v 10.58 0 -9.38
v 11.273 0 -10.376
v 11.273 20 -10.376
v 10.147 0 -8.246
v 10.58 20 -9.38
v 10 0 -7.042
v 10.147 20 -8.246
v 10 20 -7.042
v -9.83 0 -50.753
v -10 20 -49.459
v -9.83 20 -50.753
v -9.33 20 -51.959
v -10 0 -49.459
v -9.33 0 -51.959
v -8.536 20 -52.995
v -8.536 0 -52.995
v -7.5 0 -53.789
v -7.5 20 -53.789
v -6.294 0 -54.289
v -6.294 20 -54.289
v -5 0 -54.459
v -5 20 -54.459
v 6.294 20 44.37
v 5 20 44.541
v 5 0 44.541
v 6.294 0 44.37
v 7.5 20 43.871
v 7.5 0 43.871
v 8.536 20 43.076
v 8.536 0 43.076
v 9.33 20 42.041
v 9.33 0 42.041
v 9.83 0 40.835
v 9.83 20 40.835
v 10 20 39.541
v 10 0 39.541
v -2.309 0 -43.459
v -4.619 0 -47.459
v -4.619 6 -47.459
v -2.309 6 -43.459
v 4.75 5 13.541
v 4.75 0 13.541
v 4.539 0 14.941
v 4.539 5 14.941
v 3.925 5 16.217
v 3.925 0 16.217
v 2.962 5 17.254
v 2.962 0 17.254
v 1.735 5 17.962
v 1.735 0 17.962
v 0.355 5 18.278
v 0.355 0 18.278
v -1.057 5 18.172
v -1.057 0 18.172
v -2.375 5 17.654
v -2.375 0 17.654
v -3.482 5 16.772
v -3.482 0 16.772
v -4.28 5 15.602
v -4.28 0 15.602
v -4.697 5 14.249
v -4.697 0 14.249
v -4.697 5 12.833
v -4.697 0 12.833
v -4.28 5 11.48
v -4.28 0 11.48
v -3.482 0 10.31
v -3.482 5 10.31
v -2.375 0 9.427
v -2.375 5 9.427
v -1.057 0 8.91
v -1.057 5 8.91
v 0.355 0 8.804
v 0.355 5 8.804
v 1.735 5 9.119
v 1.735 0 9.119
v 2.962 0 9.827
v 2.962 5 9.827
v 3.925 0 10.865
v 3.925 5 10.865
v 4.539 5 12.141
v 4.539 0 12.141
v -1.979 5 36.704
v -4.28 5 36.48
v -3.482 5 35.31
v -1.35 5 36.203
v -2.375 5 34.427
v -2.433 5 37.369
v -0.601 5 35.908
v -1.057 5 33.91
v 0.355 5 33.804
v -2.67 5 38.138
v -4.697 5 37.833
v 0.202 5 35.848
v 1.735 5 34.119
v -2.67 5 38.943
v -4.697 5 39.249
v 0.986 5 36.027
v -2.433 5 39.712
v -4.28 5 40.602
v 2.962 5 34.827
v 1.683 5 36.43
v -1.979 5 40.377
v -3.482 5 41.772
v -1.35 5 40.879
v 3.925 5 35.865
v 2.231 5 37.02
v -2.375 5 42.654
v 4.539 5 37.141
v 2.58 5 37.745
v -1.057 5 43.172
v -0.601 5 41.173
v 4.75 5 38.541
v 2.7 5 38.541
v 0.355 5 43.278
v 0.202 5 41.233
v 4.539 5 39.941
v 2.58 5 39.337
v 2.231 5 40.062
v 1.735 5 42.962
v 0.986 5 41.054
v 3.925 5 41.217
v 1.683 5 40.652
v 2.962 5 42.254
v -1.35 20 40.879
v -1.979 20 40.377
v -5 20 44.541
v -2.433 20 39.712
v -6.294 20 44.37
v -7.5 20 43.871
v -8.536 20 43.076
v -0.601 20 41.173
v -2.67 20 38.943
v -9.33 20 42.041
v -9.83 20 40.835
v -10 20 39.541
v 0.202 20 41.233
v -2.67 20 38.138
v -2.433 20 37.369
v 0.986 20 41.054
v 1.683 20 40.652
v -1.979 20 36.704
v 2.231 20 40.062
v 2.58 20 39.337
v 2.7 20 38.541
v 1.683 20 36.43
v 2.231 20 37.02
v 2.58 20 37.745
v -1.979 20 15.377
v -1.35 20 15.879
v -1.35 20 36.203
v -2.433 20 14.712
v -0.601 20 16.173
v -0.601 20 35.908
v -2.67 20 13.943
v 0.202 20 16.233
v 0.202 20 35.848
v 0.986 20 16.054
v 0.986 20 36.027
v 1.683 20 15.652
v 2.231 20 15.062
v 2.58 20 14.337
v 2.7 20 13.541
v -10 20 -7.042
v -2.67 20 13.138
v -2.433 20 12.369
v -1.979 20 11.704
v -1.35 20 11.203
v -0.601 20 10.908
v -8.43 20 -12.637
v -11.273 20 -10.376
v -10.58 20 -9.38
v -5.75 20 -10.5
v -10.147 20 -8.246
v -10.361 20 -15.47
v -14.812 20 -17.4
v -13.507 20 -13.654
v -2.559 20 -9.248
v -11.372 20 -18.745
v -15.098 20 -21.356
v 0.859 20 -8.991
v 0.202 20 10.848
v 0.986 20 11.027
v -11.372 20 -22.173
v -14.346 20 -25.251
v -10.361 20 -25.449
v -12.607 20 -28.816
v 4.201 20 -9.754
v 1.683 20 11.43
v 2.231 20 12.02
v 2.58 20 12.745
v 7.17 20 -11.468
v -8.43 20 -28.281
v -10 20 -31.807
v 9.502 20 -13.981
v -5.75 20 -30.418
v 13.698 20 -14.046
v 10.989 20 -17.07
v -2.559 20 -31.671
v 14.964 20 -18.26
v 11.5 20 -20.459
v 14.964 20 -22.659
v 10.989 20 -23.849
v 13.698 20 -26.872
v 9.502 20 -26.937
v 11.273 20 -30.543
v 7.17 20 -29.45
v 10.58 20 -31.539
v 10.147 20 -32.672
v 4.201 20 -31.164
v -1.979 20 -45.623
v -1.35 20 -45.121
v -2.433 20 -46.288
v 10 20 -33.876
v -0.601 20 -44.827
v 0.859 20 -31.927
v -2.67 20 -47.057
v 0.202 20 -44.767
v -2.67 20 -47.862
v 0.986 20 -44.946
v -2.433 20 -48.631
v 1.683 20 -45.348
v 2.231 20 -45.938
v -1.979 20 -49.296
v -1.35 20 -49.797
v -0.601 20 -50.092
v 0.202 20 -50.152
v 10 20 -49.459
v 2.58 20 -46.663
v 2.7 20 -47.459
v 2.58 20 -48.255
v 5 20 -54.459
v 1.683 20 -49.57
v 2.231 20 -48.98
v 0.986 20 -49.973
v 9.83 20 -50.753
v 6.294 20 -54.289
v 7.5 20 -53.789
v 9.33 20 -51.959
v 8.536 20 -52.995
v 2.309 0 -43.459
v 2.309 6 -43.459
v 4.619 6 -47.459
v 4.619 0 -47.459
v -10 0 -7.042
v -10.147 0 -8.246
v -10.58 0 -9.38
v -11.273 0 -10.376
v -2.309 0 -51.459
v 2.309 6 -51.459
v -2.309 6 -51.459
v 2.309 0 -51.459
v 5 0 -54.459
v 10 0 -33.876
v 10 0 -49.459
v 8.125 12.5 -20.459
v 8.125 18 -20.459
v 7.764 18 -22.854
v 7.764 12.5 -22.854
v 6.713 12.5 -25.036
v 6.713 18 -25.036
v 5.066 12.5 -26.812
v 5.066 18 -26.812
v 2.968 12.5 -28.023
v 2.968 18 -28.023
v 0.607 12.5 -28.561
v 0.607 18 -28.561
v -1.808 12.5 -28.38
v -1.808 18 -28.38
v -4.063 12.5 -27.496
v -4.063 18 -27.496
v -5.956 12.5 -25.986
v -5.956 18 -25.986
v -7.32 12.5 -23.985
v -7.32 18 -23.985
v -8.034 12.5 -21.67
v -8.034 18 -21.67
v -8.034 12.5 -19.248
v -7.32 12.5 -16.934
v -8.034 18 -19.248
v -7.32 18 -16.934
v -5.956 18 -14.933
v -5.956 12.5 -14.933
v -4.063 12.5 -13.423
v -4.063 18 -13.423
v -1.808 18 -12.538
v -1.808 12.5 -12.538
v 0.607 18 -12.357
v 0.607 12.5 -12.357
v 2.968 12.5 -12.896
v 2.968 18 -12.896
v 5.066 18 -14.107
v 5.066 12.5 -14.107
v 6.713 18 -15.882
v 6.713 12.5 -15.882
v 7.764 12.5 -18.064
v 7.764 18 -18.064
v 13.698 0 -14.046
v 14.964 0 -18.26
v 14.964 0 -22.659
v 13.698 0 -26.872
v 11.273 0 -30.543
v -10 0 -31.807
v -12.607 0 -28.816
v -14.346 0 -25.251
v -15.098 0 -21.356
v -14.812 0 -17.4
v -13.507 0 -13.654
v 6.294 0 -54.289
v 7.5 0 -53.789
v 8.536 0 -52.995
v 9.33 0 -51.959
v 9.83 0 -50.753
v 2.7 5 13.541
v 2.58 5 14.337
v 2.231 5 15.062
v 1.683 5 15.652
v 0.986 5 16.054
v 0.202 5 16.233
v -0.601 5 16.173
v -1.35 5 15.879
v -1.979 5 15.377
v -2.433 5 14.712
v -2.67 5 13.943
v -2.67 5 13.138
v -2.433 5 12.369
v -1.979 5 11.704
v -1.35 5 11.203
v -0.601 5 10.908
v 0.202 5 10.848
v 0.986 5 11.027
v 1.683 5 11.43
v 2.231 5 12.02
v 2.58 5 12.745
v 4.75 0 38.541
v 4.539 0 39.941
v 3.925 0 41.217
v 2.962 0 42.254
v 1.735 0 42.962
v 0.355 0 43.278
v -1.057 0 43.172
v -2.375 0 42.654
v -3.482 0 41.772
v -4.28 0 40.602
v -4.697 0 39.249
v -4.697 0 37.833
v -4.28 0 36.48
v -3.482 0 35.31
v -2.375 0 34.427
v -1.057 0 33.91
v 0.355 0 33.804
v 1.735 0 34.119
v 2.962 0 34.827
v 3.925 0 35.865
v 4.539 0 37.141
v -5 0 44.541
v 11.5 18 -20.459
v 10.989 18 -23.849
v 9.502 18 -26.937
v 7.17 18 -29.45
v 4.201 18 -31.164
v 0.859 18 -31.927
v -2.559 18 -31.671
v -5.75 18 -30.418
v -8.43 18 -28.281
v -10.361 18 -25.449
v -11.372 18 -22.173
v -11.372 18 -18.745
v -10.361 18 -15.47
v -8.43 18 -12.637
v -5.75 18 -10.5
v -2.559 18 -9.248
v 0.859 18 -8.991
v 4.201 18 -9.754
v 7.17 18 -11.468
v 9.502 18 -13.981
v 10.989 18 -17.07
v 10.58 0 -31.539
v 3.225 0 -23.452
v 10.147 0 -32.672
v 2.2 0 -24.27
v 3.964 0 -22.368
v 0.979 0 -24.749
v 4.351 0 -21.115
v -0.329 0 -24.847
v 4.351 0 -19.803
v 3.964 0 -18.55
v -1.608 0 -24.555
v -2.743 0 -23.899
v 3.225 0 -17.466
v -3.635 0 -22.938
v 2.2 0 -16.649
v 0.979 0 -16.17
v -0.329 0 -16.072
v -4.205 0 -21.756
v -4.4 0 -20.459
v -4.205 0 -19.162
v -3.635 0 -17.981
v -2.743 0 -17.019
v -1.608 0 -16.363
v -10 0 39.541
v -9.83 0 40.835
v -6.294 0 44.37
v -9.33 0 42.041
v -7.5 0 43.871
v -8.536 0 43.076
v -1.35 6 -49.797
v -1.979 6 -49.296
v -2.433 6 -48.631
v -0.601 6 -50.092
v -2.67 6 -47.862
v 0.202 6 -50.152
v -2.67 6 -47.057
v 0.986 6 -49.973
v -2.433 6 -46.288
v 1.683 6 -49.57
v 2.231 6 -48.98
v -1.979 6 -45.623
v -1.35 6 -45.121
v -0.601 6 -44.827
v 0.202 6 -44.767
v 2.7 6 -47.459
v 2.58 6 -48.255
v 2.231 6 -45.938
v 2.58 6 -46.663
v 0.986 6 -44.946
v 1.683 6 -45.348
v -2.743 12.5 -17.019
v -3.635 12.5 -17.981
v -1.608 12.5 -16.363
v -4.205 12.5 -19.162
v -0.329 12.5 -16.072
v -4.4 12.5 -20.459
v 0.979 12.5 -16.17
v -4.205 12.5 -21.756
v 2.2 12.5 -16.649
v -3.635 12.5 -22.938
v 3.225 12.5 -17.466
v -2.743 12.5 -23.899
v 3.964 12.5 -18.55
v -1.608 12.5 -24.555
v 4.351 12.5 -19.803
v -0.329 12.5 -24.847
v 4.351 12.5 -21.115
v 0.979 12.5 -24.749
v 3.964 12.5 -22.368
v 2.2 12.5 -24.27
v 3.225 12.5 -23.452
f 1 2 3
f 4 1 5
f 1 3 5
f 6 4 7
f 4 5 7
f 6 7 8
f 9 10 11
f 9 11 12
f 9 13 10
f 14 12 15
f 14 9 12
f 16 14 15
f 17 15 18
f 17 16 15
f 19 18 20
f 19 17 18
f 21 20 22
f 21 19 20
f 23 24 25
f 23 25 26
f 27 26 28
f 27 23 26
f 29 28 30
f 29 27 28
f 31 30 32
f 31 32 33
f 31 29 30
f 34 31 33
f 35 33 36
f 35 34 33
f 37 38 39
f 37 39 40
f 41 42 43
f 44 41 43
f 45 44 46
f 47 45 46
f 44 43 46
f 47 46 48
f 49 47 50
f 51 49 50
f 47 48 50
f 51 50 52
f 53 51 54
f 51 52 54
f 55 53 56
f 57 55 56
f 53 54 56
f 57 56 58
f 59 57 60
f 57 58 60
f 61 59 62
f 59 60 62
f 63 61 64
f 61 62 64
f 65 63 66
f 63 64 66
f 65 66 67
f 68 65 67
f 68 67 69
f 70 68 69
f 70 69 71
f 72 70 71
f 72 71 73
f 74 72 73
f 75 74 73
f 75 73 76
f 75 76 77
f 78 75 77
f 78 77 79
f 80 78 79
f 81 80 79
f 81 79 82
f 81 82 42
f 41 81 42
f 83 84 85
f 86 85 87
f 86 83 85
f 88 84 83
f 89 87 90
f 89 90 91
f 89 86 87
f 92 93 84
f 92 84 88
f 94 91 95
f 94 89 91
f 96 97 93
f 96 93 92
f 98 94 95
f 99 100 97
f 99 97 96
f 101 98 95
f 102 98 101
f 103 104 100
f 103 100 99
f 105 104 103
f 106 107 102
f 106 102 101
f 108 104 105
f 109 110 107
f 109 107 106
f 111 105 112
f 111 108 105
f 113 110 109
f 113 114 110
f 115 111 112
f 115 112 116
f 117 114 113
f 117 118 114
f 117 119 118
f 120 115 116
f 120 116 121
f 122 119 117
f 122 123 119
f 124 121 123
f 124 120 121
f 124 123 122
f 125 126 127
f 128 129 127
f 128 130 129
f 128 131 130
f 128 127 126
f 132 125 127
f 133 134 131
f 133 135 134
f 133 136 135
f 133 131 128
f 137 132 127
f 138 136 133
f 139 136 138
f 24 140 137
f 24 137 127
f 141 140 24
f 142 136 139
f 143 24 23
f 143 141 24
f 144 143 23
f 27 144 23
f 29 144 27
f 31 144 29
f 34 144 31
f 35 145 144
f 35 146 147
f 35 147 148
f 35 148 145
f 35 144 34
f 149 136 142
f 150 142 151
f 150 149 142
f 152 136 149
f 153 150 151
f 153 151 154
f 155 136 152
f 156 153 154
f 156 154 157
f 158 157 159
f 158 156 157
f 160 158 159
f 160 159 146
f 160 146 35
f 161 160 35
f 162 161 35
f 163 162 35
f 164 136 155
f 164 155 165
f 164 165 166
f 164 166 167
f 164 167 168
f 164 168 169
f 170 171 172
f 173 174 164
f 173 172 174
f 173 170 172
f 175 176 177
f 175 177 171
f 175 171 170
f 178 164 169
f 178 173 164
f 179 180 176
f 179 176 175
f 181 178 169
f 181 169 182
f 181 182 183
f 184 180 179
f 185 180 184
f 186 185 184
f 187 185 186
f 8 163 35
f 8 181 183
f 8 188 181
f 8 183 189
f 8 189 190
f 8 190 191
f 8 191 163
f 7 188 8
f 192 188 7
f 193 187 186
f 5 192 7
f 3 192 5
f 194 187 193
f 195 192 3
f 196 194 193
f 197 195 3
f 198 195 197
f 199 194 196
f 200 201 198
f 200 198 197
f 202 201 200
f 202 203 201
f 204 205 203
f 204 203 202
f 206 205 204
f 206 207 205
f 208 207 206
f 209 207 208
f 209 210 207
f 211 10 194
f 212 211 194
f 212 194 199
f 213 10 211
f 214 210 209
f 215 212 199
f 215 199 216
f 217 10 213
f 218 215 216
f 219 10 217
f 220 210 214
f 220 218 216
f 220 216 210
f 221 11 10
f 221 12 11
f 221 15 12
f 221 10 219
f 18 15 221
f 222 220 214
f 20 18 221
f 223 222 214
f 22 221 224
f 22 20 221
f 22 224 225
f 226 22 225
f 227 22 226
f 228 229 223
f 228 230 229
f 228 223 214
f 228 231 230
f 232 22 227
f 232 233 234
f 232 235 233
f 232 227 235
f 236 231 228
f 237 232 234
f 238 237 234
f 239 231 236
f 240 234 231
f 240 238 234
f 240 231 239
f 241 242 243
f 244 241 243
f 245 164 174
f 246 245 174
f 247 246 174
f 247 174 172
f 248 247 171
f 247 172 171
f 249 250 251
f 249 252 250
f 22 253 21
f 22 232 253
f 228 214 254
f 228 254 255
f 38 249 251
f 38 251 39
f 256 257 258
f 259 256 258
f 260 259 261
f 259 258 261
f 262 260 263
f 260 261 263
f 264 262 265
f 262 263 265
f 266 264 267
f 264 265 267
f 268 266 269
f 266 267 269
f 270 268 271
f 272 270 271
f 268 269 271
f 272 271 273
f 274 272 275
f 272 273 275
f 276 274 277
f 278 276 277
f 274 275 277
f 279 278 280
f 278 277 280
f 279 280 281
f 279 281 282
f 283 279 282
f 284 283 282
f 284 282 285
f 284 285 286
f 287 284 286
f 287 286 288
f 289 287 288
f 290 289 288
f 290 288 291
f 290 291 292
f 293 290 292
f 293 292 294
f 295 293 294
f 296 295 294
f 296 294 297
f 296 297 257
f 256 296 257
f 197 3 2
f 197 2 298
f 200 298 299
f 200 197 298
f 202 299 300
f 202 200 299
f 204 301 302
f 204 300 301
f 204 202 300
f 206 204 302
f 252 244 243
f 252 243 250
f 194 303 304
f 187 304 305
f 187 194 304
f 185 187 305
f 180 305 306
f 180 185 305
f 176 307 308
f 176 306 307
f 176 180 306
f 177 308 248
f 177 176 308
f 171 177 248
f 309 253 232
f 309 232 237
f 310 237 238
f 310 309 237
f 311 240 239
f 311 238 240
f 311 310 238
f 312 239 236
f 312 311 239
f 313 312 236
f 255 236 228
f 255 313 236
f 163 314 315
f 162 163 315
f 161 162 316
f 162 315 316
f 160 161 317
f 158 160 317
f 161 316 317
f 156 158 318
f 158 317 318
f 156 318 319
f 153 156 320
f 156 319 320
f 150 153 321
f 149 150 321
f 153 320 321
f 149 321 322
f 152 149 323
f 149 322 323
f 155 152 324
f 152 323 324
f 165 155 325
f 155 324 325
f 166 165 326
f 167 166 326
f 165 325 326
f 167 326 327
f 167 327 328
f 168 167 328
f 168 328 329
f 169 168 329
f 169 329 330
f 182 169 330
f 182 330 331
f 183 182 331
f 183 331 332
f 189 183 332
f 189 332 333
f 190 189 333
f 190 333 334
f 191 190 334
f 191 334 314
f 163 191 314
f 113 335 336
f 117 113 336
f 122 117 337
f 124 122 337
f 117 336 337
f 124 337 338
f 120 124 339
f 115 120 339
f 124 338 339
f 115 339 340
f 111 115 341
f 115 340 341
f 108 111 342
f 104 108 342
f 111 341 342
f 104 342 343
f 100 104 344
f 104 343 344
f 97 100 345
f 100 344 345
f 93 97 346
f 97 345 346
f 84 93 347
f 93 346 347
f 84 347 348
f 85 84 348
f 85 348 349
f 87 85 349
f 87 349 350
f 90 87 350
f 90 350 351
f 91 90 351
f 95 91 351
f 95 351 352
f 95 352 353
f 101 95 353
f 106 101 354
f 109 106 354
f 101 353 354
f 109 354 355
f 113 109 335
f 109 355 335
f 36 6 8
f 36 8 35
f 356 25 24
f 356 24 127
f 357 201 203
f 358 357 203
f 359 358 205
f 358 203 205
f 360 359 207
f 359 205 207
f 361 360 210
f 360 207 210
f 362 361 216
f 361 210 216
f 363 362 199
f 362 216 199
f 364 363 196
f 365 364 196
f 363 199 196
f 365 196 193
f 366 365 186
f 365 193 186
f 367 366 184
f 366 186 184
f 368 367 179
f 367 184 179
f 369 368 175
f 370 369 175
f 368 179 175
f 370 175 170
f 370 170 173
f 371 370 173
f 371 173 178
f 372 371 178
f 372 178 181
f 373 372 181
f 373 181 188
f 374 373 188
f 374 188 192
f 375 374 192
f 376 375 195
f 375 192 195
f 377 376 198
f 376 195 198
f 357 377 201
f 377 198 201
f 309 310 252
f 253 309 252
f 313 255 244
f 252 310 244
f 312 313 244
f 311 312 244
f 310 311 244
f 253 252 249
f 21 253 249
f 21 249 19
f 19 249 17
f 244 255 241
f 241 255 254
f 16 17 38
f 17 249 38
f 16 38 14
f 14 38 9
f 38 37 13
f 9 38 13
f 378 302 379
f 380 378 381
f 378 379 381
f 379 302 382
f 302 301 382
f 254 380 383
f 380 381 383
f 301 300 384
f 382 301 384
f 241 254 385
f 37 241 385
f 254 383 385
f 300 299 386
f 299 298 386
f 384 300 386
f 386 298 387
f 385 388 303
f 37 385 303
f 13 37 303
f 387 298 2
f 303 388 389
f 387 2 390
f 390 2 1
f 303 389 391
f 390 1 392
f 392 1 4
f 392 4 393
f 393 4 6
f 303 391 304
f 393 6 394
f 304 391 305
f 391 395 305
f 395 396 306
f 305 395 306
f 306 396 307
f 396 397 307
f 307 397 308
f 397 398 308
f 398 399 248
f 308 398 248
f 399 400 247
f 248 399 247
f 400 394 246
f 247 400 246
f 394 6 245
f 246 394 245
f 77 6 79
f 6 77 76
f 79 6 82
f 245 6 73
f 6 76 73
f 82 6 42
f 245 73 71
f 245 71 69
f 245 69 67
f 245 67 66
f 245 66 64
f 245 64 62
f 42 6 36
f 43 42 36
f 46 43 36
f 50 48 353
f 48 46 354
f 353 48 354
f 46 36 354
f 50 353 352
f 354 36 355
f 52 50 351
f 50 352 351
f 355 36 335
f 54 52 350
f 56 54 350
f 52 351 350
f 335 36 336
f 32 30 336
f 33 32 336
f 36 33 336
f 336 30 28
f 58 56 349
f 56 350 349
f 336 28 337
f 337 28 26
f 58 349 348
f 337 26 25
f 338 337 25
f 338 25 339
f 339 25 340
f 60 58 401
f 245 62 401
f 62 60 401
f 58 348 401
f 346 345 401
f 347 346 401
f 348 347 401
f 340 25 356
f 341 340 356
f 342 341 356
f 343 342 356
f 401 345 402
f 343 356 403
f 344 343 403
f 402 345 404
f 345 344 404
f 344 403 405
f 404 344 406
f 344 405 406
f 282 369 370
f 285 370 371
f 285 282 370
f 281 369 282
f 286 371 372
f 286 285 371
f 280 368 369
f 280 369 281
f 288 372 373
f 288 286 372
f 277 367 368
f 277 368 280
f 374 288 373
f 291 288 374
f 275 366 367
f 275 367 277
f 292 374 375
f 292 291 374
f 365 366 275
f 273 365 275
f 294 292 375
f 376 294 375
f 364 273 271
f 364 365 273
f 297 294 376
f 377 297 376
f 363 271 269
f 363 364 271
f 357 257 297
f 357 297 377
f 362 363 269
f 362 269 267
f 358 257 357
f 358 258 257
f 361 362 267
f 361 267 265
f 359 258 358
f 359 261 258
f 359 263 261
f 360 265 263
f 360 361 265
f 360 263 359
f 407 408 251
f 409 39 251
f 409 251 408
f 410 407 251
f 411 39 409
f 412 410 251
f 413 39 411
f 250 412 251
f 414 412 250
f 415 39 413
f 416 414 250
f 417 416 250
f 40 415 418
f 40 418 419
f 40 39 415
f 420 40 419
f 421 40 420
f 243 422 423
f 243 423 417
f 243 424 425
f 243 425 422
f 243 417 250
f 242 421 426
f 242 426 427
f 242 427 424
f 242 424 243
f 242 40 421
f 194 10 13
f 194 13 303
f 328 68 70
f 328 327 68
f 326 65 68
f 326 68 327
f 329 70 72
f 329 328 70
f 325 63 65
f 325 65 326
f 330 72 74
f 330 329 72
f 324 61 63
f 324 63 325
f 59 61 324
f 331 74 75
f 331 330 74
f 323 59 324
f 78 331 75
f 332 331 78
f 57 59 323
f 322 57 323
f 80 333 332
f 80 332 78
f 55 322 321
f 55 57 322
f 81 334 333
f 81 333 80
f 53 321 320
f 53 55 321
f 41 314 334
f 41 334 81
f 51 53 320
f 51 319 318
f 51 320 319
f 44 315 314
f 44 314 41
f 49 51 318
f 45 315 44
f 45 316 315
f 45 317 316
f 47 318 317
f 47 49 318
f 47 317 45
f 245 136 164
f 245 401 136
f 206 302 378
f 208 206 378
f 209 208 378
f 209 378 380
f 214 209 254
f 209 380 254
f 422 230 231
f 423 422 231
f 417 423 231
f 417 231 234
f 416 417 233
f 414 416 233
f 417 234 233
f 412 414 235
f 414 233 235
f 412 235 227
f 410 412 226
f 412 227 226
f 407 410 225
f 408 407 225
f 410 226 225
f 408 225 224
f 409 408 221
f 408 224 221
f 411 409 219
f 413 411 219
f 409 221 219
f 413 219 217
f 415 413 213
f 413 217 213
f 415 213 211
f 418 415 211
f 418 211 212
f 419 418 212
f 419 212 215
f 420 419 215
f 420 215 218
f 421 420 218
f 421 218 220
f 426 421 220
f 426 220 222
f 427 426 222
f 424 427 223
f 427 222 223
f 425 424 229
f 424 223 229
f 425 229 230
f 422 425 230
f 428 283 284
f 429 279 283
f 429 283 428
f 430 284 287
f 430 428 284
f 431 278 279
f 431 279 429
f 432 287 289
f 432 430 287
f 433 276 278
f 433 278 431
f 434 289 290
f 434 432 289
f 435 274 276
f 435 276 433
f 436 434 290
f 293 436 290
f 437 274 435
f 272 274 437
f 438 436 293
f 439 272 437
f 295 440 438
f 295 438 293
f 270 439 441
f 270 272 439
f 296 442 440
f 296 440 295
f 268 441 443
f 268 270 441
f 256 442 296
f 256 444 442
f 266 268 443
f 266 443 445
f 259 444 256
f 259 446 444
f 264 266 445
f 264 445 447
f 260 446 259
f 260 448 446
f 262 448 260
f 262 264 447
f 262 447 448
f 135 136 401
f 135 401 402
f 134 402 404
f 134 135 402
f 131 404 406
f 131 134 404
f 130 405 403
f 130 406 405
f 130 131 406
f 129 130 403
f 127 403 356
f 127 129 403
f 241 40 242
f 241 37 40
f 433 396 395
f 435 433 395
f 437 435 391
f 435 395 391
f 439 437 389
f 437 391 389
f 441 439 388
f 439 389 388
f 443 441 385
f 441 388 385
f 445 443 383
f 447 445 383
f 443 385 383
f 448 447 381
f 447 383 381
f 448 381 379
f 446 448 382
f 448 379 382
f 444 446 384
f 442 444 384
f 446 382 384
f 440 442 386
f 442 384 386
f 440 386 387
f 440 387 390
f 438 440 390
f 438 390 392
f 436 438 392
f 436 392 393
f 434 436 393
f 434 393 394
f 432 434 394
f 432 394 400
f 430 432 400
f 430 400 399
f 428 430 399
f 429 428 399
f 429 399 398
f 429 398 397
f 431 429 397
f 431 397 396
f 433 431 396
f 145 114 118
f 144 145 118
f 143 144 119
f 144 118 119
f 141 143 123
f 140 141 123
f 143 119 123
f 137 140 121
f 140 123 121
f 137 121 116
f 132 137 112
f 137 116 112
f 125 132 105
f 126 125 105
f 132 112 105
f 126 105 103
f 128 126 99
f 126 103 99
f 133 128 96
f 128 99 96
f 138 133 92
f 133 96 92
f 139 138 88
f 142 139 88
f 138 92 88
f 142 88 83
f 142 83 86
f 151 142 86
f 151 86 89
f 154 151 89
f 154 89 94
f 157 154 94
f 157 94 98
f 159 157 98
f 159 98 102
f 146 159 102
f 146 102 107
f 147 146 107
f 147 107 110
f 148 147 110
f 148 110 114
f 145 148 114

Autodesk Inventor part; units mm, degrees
ref_plane "YZ Plane" through (0, 0, 0) normal (1, 0, 0) x (0, 1, 0)
ref_plane "XZ Plane" through (0, 0, 0) normal (0, 1, 0) x (-1, 0, 0)
ref_plane "XY Plane" through (0, 0, 0) normal (0, 0, 1) x (1, 0, 0)
sketch "Boceto1" plane through (0, 0, 0) normal (0, 1, 0) x (-1, 0, 0)
  line L0 (-10, 44.5408) -> (10, 44.5408)
  line L1 (10, 44.5408) -> (10, -27.9592)
  line L2 (10, -27.9592) -> (-10, -27.9592)
  line L3 (-10, -27.9592) -> (-10, 44.5408)
  line L4 (-10, 44.5408) -> (10, -27.9592) construction
  line L5 (10, 44.5408) -> (-10, -27.9592) construction
  circle A0 centre (0, -20.4592) radius 4.4
  point P0 (0, 8.2908)
  dimension "d1" = 20
  dimension "d2" = 8.8
  dimension "d3" = 7.5
  dimension "d26" = 65
extrude "Extrusión1" add sketch "Boceto1" along normal blind 20
sketch "Boceto2" plane through (0, 20, 0) normal (0, 1, 0) x (1, 0, 0)
  circle A0 centre (0, 20.4592) radius 4.4 projected
  circle A1 centre (0, 20.4592) radius 12.125
  point P0 (0, 0)
  dimension "d6" = 24.25
extrude "Extrusión2" cut sketch "Boceto2" against normal blind 2.5
sketch "Boceto3" plane through (0, 20, 0) normal (0, 1, 0) x (1, 0, 0)
  circle A0 centre (0, 20.4592) radius 4.4 projected
  circle A1 centre (0, 20.4592) radius 12.125
  circle A2 centre (0, 20.4592) radius 15.125
  line L0 (10, 27.316) -> (10, 13.6024) projected
  arc A3 (10, 27.316) -> (9.5271, 27.9592) centre (0, 20.4592) ccw projected
  line L1 (-9.5271, 27.9592) -> (9.5271, 27.9592) projected
  arc A4 (-9.5271, 27.9592) -> (-10, 27.316) centre (0, 20.4592) ccw projected
  line L2 (-10, 13.6024) -> (-10, 27.316) projected
  arc A5 (-10, 13.6024) -> (10, 13.6024) centre (0, 20.4592) ccw projected
  circle A6 centre (0, 20.4592) radius 4.4 projected
  point P0 (0, 0)
  point P1 (-10, 27.316)
  point P2 (10, 27.316)
  point P3 (9.5271, 27.9592)
  dimension "d9" = 3
extrude "Extrusión3" add sketch "Boceto3" against normal up to surface (20 mm away) contours A1 L0 | L1 A1 | A1 L2 | A2
sketch "Boceto4" plane through (0, 20, 0) normal (0, 1, 0) x (1, 0, 0)
  circle A0 centre (0, 20.4592) radius 4.4 projected
  circle A1 centre (0, 20.4592) radius 12.15
  point P0 (0, 0)
  dimension "d14" = 24.3
extrude "Extrusión4" cut sketch "Boceto4" against normal blind 2 contours A0 | A1
sketch "Boceto5" plane through (0, 17.5, 0) normal (0, 1, 0) x (1, 0, 0)
  line L0 (10, 27.316) -> (10, 13.6024) projected
  arc A0 (10, 27.316) -> (9.5271, 27.9592) centre (0, 20.4592) ccw projected
  line L1 (-9.5271, 27.9592) -> (9.5271, 27.9592) projected
  arc A1 (-9.5271, 27.9592) -> (-10, 27.316) centre (0, 20.4592) ccw projected
  line L2 (-10, 13.6024) -> (-10, 27.316) projected
  arc A2 (-10, 13.6024) -> (10, 13.6024) centre (0, 20.4592) ccw projected
  circle A3 centre (0, 20.4592) radius 4.4 projected
  point P0 (0, 0)
extrude "Extrusión5" add sketch "Boceto5" along normal up to surface (0.5 mm away)
sketch "Boceto6" plane through (0, 0, 0) normal (0, -1, 0) x (1, 0, 0)
  circle A0 centre (0, 38.5408) radius 2.7
  circle A1 centre (0, 13.5408) radius 2.7
  line L0 (-10, 44.5408) -> (10, 44.5408) projected
  point P0 (0, 0)
  dimension "d20" = 25
  dimension "d21" = 5.4
  dimension "d30" = 6
extrude "Extrusión6" cut sketch "Boceto6" against normal through all
sketch "Boceto8" plane through (0, 18, -20.4592) normal (0, 1, 0) x (1, 0, 0)
  circle A0 centre (0, 0) radius 4.4 projected
  circle A1 centre (0, 0) radius 8.125
  point P0 (0, -20.4592)
  dimension "d31" = 16.25
extrude "Extrusión8" cut sketch "Boceto8" against normal blind 5.5 contours A0 | A1
fillet "Empalme4" radius 5 4 edges at (10, 10, 44.5408) (-10, 10, 44.5408) (10, 10, -9.1117) (-10, 10, -9.1117)
sketch "Boceto9" plane through (0, 20, 0) normal (0, 1, 0) x (1, 0, 0)
  arc A0 (11.2733, 10.3756) -> (-11.2733, 10.3756) centre (0, 20.4592) ccw projected
  line L0 (-10, 31.8067) -> (10, 31.8067)
  line L1 (10, 31.8067) -> (10, 54.4592)
  line L2 (10, 54.4592) -> (-10, 54.4592)
  line L3 (-10, 54.4592) -> (-10, 31.8067)
  line L4 (-10, 7.0422) -> (-10, -39.5408) projected
  line L5 (10, -39.5408) -> (10, 7.0422) projected
  circle A1 centre (0, 20.4592) radius 21
  circle A2 centre (0, 47.4592) radius 2.7
  point P0 (0, 0)
  dimension "d36" = 42
  dimension "d37" = 34
  dimension "d38" = 5.4
  dimension "d39" = 7
extrude "Extrusión9" add sketch "Boceto9" against normal up to surface (20 mm away) contours A0 L3 A1 L1 | A1 L3 L2 L1
fillet "Empalme5" radius 5 3 edges at (10, 10, -31.8067) (10, 10, -54.4592) (-10, 10, -54.4592)
sketch "Boceto10" plane through (0, 0, 0) normal (0, -1, 0) x (1, 0, 0)
  circle A0 centre (0, -47.4592) radius 2.7 projected
  circle A1 centre (0, -47.4592) radius 4
  line L0 (-4.6188, -47.4592) -> (-2.3094, -43.4592)
  line L1 (-2.3094, -43.4592) -> (2.3094, -43.4592)
  line L2 (2.3094, -43.4592) -> (4.6188, -47.4592)
  line L3 (4.6188, -47.4592) -> (2.3094, -51.4592)
  line L4 (2.3094, -51.4592) -> (-2.3094, -51.4592)
  line L5 (-2.3094, -51.4592) -> (-4.6188, -47.4592)
  point P0 (0, 6.5408)
  dimension "d43" = 8
extrude "Extrusión10" cut sketch "Boceto10" against normal blind 6 contours A0 | A1 | A1 L2 L3 | A1 L1 L2 | L3 L4 A1 | A1 L0 L1 | L4 L5 A1 | A1 L5 L0
sketch "Boceto11" plane through (0, 0, 0) normal (0, -1, 0) x (1, 0, 0)
  circle A0 centre (0, 38.5408) radius 2.7 projected
  circle A1 centre (0, 38.5408) radius 4.75
  circle A2 centre (0, 13.5408) radius 2.7 projected
  circle A3 centre (0, 13.5408) radius 4.75
  point P0 (0, 0)
  dimension "d46" = 9.5
  dimension "d47" = 9.5
extrude "Extrusión11" cut sketch "Boceto11" against normal blind 5
sketch "Boceto12" plane through (0, 20, 0) normal (0, 1, 0) x (1, 0, 0)
  circle A0 centre (0, 20.4592) radius 8.125 projected
  circle A1 centre (0, 20.4592) radius 8.125 projected
  circle A2 centre (0, 20.4592) radius 12.15 projected
  point P0 (0, 0)
extrude "Extrusión12" add sketch "Boceto12" against normal up to surface (2 mm away)
sketch "Boceto14" plane through (0, 20, 0) normal (0, 1, 0) x (1, 0, 0)
  circle A0 centre (0, 20.4592) radius 8.125 projected
  circle A1 centre (0, 20.4592) radius 11.5
  point P0 (0, 0)
  dimension "d55" = 23
extrude "Extrusión14" cut sketch "Boceto14" against normal blind 2
sketch "Boceto13" plane through (0, 12.5, -20.4592) normal (0, 1, 0) x (1, 0, 0)
  circle A0 centre (0, 0) radius 4.4 projected
  circle A1 centre (0, 0) radius 8.125 projected
  point P0 (0, -20.4592)
properties part number "bottomsupport"
